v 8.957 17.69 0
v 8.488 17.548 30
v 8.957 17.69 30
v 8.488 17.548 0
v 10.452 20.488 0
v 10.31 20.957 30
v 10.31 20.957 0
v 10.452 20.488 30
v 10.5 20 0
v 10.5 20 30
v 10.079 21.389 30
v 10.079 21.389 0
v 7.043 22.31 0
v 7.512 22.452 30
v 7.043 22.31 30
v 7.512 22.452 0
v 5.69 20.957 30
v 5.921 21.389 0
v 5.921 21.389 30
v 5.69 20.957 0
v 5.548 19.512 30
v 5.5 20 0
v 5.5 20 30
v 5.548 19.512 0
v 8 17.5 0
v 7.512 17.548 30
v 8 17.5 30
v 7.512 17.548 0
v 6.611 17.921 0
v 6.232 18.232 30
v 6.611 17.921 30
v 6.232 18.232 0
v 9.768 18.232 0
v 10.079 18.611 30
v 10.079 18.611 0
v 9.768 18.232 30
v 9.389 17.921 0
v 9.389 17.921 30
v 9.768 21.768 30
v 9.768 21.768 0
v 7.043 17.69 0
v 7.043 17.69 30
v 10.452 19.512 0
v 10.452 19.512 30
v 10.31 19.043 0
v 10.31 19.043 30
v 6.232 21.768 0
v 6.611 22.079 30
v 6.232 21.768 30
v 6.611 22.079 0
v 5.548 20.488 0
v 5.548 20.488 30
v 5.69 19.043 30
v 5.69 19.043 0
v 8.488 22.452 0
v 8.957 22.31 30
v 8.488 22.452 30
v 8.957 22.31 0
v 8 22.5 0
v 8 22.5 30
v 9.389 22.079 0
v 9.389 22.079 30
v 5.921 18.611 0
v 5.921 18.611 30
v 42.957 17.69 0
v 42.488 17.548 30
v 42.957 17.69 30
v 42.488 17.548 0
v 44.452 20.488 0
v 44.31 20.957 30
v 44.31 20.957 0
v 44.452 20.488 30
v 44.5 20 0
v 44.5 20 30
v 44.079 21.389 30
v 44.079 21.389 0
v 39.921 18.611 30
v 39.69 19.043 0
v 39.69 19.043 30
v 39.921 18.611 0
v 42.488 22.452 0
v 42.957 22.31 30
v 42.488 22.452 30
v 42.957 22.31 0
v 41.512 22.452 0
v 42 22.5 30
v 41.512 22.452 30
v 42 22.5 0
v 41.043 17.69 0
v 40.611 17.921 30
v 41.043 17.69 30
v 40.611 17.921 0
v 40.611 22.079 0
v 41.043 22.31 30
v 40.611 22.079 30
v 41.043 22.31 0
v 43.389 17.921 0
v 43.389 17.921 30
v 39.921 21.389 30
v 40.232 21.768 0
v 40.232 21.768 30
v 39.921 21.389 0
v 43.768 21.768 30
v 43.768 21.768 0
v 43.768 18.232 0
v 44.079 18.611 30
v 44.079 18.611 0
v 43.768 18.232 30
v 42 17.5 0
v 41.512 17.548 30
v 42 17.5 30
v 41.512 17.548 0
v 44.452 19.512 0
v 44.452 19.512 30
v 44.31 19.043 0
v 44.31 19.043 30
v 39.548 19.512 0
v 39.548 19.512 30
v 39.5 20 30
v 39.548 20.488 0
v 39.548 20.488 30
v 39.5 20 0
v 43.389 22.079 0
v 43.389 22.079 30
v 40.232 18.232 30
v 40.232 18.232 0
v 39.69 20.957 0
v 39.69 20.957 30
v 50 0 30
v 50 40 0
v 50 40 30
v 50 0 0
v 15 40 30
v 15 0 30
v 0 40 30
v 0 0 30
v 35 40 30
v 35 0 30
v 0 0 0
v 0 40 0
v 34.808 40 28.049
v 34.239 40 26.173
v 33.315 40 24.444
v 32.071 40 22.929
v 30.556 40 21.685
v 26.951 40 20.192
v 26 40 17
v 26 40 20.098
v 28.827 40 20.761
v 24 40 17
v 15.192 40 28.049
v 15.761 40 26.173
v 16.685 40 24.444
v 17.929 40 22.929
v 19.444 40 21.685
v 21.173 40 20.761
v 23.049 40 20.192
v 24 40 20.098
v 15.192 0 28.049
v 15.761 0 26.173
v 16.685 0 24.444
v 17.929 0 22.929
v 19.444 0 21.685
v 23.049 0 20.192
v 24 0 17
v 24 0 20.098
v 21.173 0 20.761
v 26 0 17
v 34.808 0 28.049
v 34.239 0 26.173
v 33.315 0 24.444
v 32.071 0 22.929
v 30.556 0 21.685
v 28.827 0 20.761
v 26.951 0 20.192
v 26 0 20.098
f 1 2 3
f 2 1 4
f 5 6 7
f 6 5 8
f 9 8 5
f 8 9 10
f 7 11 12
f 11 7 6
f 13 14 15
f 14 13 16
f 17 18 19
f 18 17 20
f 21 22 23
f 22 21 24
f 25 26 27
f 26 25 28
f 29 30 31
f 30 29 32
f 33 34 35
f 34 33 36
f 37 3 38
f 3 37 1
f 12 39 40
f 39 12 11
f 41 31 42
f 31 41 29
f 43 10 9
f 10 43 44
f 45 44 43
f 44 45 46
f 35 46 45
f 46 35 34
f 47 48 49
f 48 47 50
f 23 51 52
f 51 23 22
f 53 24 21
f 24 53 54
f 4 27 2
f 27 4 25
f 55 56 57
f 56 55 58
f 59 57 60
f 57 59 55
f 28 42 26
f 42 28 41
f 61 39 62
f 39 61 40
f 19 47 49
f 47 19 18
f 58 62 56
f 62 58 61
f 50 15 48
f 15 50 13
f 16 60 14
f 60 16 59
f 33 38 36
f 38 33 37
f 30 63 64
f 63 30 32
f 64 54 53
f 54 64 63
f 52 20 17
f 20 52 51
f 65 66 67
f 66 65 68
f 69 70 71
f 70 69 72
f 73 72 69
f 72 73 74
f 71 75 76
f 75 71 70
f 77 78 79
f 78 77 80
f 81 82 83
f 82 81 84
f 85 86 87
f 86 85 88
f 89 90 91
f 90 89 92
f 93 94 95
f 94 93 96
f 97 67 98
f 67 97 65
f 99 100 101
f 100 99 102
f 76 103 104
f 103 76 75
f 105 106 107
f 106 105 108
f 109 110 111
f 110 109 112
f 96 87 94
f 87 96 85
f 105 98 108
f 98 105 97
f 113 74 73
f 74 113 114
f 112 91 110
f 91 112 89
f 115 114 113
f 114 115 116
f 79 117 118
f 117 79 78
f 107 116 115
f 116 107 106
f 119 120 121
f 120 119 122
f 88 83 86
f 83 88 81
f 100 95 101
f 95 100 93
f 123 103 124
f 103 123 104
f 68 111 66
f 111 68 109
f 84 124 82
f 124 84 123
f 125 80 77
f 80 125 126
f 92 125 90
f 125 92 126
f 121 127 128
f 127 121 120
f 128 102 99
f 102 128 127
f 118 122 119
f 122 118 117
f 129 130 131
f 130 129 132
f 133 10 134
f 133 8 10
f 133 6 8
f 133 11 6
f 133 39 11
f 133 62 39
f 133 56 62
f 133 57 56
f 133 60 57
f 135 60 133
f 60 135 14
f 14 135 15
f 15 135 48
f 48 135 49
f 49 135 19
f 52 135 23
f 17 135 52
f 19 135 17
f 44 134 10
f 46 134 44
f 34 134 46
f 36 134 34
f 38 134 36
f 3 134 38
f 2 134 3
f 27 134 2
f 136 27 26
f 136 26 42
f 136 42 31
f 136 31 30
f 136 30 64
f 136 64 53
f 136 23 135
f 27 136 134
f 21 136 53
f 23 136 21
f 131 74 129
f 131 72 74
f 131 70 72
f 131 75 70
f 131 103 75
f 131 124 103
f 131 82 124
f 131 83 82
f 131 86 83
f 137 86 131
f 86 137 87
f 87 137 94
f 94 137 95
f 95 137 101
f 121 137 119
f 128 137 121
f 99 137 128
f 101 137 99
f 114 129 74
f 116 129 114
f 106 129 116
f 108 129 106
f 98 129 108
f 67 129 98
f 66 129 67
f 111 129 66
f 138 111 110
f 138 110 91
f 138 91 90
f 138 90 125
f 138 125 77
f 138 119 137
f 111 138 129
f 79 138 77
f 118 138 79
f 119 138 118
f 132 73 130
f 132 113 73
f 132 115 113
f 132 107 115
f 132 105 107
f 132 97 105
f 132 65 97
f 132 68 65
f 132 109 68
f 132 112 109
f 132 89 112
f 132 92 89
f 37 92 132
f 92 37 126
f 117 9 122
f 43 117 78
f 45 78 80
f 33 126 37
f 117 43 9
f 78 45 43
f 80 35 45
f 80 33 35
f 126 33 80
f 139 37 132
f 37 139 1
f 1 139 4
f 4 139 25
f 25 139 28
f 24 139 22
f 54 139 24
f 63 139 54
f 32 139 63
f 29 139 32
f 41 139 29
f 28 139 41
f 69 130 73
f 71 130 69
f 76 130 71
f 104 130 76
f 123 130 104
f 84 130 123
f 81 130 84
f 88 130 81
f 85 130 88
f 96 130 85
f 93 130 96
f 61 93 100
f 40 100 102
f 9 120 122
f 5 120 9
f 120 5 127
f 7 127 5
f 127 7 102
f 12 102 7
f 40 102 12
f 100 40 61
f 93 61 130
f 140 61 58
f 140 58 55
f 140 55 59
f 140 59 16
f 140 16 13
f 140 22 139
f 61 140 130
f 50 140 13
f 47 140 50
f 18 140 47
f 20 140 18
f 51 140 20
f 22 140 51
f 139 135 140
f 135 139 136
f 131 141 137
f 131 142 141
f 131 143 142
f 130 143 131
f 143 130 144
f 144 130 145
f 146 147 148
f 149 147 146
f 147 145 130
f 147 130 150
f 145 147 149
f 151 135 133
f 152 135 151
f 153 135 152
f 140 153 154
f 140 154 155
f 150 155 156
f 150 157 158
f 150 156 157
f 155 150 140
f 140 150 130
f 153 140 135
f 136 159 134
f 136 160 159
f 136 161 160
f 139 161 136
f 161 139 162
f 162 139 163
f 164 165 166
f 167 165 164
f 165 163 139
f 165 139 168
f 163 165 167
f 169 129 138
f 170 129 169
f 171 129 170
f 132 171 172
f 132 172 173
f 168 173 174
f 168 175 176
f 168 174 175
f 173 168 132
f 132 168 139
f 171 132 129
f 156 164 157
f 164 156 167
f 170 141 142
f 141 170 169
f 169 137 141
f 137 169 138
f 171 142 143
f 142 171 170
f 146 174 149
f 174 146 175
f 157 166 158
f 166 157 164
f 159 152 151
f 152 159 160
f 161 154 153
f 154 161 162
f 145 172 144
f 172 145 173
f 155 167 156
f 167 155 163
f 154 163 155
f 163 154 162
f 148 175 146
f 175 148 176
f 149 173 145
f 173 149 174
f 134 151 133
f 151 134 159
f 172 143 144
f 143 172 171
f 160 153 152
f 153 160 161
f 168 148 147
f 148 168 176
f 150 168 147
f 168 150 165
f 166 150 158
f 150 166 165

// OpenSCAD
$fn = 32;

// ----------------------------------------------------------------------
// Saddle clamp: split shaft clamp
// ----------------------------------------------------------------------

// --- parameters (mm) ---
blk_l = 50;               // block length, X
blk_w = 40;               // block width, Y
blk_h = 30;               // block height
clamp_r = 10;             // shaft groove radius
hole_r = 2.5;             // bolt hole radius
hole_m = 8;               // bolt hole margin from the ends
saw_w = 2;                // saw kerf width

saw_depth = clamp_r + 3;  // saw kerf depth

difference() {
  cube([blk_l, blk_w, blk_h]);
  translate([blk_l / 2, -1, blk_h])
    rotate([-90, 0, 0])
      cylinder(h = blk_w + 2, r = clamp_r);
  for (sx = [0, 1])
    translate([sx ? blk_l - hole_m : hole_m, blk_w / 2, -1])
      cylinder(r = hole_r, h = blk_h + 2);
  translate([blk_l / 2 - saw_w / 2, -1, blk_h - saw_depth])
    cube([saw_w, blk_w + 2, saw_depth + 1]);
}
